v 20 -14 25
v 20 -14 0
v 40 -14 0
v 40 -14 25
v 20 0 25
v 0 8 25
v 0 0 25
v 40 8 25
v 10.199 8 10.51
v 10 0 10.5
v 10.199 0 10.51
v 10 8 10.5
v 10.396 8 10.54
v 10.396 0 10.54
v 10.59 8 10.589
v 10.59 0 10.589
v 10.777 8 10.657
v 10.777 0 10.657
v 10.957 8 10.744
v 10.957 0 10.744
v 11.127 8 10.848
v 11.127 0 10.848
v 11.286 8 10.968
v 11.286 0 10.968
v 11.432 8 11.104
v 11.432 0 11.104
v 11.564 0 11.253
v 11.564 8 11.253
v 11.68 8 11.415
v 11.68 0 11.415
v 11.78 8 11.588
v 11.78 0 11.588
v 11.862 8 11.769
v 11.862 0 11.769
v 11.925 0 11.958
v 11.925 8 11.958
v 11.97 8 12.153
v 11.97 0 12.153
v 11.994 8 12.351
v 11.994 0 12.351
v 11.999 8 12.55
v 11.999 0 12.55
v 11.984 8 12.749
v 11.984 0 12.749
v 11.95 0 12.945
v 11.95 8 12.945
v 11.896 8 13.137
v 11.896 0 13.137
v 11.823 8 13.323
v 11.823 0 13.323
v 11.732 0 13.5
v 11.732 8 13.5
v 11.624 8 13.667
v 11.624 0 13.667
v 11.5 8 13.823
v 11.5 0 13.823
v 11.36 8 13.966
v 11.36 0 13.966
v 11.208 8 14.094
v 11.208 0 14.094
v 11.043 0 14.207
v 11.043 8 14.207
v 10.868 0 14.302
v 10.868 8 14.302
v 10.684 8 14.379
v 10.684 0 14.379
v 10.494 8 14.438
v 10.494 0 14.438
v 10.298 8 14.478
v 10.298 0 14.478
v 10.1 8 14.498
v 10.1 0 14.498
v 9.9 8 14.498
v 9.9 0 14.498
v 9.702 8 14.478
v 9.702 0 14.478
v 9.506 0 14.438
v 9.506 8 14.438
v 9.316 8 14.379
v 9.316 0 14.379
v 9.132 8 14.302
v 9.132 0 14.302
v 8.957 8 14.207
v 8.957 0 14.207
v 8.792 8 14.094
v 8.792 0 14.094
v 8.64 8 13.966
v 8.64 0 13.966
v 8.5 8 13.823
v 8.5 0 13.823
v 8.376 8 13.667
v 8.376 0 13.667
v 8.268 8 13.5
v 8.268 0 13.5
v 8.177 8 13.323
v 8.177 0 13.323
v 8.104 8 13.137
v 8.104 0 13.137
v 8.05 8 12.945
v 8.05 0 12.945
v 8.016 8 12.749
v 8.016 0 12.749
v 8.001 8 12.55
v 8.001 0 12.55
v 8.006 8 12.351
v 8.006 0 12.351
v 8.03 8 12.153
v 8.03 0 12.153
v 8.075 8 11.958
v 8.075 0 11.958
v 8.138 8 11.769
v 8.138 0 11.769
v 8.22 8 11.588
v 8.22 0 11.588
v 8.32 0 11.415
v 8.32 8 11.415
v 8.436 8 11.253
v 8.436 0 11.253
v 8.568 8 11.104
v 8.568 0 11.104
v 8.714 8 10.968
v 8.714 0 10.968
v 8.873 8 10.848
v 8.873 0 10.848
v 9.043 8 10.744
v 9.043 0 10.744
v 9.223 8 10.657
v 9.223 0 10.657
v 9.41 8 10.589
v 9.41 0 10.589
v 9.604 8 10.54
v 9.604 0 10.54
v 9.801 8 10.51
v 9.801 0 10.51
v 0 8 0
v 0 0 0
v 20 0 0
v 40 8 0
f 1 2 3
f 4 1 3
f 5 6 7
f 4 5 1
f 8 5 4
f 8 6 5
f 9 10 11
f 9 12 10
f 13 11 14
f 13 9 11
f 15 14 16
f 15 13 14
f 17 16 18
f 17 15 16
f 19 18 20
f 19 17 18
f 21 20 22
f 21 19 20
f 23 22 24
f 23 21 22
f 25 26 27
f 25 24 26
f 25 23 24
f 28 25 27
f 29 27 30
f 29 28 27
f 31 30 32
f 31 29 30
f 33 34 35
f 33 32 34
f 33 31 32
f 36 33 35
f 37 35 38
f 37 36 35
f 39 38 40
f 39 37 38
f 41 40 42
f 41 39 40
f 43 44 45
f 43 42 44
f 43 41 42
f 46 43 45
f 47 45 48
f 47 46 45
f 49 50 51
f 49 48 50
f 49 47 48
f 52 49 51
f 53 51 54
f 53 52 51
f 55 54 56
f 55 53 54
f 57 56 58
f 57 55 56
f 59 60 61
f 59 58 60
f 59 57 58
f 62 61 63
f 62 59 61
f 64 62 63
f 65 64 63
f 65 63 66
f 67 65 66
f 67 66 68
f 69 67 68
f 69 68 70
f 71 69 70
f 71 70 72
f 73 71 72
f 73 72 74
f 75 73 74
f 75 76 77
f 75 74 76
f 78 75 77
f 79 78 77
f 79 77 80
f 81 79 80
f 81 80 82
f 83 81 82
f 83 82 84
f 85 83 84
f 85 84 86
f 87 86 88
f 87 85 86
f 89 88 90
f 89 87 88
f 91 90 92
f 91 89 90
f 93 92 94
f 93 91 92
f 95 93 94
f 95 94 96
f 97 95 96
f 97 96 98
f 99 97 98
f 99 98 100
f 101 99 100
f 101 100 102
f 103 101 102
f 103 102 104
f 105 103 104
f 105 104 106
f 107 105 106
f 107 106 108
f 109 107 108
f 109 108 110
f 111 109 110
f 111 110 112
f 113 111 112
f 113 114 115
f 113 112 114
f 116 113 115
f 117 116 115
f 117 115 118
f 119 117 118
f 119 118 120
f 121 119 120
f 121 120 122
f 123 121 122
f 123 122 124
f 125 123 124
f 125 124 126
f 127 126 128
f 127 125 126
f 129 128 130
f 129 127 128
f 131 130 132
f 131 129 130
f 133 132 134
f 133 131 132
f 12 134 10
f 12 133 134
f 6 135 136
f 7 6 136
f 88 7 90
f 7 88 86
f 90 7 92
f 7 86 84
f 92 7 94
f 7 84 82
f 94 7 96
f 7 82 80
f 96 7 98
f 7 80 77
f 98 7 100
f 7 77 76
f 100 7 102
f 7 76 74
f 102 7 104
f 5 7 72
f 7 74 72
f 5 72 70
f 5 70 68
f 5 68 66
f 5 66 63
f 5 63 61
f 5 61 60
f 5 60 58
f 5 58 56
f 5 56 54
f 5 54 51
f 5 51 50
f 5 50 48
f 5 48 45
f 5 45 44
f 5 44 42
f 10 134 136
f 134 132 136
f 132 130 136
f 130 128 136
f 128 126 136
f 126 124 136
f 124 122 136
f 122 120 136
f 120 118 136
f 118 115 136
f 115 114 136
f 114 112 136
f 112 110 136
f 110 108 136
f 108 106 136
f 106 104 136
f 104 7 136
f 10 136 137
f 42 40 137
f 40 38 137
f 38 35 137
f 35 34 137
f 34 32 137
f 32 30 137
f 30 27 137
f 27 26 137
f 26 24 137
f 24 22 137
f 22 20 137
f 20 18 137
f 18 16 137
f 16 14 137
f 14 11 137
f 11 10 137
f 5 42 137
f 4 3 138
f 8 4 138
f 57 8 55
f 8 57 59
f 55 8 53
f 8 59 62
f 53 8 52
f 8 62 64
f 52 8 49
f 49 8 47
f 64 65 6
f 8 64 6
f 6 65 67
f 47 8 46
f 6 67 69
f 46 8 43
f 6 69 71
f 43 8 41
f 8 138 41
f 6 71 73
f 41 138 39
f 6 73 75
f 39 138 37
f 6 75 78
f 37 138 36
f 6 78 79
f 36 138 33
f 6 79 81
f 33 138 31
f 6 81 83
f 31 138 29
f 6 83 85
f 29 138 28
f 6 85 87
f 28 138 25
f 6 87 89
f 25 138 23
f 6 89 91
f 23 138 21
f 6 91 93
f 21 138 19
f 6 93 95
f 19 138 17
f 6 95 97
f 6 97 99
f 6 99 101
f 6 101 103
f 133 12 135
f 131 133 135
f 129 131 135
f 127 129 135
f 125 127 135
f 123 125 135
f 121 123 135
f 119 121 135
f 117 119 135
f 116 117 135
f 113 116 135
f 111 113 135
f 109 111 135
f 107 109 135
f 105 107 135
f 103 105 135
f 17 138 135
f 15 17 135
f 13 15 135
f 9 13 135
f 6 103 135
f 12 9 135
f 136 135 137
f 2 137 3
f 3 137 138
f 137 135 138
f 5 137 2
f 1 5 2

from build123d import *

# Parameters (mm, degrees)
BOSS_EXTRU_1_DEPTH           = 25
ENL_V_MAT_EXTRU_1_DEPTH      = 50.203658401
ENL_V_MAT_EXTRU_1_DEPTH_BACK = 50.203658401
ESQUISSE2_R                  = 2


with BuildPart() as part:
    # Esquisse1 → Boss.-Extru.1 (new body)
    with BuildSketch(Plane.XY):
        Polygon((0, 0), (20, 0), (20, -14), (40, -14), (40, 8), (0, 8), align=None)
    extrude(amount=BOSS_EXTRU_1_DEPTH)

    # Esquisse2 → Enlèv. mat.-Extru.1 (cut, two sides: drawn at the far end of the back side and taken through both)
    with BuildSketch(Plane.XZ.offset(-ENL_V_MAT_EXTRU_1_DEPTH_BACK)):
        with Locations(Location((10, 12.5, 0), (0, 0, 270))):
            Circle(ESQUISSE2_R)
    extrude(amount=ENL_V_MAT_EXTRU_1_DEPTH + ENL_V_MAT_EXTRU_1_DEPTH_BACK, mode=Mode.SUBTRACT)


solid = part.part
